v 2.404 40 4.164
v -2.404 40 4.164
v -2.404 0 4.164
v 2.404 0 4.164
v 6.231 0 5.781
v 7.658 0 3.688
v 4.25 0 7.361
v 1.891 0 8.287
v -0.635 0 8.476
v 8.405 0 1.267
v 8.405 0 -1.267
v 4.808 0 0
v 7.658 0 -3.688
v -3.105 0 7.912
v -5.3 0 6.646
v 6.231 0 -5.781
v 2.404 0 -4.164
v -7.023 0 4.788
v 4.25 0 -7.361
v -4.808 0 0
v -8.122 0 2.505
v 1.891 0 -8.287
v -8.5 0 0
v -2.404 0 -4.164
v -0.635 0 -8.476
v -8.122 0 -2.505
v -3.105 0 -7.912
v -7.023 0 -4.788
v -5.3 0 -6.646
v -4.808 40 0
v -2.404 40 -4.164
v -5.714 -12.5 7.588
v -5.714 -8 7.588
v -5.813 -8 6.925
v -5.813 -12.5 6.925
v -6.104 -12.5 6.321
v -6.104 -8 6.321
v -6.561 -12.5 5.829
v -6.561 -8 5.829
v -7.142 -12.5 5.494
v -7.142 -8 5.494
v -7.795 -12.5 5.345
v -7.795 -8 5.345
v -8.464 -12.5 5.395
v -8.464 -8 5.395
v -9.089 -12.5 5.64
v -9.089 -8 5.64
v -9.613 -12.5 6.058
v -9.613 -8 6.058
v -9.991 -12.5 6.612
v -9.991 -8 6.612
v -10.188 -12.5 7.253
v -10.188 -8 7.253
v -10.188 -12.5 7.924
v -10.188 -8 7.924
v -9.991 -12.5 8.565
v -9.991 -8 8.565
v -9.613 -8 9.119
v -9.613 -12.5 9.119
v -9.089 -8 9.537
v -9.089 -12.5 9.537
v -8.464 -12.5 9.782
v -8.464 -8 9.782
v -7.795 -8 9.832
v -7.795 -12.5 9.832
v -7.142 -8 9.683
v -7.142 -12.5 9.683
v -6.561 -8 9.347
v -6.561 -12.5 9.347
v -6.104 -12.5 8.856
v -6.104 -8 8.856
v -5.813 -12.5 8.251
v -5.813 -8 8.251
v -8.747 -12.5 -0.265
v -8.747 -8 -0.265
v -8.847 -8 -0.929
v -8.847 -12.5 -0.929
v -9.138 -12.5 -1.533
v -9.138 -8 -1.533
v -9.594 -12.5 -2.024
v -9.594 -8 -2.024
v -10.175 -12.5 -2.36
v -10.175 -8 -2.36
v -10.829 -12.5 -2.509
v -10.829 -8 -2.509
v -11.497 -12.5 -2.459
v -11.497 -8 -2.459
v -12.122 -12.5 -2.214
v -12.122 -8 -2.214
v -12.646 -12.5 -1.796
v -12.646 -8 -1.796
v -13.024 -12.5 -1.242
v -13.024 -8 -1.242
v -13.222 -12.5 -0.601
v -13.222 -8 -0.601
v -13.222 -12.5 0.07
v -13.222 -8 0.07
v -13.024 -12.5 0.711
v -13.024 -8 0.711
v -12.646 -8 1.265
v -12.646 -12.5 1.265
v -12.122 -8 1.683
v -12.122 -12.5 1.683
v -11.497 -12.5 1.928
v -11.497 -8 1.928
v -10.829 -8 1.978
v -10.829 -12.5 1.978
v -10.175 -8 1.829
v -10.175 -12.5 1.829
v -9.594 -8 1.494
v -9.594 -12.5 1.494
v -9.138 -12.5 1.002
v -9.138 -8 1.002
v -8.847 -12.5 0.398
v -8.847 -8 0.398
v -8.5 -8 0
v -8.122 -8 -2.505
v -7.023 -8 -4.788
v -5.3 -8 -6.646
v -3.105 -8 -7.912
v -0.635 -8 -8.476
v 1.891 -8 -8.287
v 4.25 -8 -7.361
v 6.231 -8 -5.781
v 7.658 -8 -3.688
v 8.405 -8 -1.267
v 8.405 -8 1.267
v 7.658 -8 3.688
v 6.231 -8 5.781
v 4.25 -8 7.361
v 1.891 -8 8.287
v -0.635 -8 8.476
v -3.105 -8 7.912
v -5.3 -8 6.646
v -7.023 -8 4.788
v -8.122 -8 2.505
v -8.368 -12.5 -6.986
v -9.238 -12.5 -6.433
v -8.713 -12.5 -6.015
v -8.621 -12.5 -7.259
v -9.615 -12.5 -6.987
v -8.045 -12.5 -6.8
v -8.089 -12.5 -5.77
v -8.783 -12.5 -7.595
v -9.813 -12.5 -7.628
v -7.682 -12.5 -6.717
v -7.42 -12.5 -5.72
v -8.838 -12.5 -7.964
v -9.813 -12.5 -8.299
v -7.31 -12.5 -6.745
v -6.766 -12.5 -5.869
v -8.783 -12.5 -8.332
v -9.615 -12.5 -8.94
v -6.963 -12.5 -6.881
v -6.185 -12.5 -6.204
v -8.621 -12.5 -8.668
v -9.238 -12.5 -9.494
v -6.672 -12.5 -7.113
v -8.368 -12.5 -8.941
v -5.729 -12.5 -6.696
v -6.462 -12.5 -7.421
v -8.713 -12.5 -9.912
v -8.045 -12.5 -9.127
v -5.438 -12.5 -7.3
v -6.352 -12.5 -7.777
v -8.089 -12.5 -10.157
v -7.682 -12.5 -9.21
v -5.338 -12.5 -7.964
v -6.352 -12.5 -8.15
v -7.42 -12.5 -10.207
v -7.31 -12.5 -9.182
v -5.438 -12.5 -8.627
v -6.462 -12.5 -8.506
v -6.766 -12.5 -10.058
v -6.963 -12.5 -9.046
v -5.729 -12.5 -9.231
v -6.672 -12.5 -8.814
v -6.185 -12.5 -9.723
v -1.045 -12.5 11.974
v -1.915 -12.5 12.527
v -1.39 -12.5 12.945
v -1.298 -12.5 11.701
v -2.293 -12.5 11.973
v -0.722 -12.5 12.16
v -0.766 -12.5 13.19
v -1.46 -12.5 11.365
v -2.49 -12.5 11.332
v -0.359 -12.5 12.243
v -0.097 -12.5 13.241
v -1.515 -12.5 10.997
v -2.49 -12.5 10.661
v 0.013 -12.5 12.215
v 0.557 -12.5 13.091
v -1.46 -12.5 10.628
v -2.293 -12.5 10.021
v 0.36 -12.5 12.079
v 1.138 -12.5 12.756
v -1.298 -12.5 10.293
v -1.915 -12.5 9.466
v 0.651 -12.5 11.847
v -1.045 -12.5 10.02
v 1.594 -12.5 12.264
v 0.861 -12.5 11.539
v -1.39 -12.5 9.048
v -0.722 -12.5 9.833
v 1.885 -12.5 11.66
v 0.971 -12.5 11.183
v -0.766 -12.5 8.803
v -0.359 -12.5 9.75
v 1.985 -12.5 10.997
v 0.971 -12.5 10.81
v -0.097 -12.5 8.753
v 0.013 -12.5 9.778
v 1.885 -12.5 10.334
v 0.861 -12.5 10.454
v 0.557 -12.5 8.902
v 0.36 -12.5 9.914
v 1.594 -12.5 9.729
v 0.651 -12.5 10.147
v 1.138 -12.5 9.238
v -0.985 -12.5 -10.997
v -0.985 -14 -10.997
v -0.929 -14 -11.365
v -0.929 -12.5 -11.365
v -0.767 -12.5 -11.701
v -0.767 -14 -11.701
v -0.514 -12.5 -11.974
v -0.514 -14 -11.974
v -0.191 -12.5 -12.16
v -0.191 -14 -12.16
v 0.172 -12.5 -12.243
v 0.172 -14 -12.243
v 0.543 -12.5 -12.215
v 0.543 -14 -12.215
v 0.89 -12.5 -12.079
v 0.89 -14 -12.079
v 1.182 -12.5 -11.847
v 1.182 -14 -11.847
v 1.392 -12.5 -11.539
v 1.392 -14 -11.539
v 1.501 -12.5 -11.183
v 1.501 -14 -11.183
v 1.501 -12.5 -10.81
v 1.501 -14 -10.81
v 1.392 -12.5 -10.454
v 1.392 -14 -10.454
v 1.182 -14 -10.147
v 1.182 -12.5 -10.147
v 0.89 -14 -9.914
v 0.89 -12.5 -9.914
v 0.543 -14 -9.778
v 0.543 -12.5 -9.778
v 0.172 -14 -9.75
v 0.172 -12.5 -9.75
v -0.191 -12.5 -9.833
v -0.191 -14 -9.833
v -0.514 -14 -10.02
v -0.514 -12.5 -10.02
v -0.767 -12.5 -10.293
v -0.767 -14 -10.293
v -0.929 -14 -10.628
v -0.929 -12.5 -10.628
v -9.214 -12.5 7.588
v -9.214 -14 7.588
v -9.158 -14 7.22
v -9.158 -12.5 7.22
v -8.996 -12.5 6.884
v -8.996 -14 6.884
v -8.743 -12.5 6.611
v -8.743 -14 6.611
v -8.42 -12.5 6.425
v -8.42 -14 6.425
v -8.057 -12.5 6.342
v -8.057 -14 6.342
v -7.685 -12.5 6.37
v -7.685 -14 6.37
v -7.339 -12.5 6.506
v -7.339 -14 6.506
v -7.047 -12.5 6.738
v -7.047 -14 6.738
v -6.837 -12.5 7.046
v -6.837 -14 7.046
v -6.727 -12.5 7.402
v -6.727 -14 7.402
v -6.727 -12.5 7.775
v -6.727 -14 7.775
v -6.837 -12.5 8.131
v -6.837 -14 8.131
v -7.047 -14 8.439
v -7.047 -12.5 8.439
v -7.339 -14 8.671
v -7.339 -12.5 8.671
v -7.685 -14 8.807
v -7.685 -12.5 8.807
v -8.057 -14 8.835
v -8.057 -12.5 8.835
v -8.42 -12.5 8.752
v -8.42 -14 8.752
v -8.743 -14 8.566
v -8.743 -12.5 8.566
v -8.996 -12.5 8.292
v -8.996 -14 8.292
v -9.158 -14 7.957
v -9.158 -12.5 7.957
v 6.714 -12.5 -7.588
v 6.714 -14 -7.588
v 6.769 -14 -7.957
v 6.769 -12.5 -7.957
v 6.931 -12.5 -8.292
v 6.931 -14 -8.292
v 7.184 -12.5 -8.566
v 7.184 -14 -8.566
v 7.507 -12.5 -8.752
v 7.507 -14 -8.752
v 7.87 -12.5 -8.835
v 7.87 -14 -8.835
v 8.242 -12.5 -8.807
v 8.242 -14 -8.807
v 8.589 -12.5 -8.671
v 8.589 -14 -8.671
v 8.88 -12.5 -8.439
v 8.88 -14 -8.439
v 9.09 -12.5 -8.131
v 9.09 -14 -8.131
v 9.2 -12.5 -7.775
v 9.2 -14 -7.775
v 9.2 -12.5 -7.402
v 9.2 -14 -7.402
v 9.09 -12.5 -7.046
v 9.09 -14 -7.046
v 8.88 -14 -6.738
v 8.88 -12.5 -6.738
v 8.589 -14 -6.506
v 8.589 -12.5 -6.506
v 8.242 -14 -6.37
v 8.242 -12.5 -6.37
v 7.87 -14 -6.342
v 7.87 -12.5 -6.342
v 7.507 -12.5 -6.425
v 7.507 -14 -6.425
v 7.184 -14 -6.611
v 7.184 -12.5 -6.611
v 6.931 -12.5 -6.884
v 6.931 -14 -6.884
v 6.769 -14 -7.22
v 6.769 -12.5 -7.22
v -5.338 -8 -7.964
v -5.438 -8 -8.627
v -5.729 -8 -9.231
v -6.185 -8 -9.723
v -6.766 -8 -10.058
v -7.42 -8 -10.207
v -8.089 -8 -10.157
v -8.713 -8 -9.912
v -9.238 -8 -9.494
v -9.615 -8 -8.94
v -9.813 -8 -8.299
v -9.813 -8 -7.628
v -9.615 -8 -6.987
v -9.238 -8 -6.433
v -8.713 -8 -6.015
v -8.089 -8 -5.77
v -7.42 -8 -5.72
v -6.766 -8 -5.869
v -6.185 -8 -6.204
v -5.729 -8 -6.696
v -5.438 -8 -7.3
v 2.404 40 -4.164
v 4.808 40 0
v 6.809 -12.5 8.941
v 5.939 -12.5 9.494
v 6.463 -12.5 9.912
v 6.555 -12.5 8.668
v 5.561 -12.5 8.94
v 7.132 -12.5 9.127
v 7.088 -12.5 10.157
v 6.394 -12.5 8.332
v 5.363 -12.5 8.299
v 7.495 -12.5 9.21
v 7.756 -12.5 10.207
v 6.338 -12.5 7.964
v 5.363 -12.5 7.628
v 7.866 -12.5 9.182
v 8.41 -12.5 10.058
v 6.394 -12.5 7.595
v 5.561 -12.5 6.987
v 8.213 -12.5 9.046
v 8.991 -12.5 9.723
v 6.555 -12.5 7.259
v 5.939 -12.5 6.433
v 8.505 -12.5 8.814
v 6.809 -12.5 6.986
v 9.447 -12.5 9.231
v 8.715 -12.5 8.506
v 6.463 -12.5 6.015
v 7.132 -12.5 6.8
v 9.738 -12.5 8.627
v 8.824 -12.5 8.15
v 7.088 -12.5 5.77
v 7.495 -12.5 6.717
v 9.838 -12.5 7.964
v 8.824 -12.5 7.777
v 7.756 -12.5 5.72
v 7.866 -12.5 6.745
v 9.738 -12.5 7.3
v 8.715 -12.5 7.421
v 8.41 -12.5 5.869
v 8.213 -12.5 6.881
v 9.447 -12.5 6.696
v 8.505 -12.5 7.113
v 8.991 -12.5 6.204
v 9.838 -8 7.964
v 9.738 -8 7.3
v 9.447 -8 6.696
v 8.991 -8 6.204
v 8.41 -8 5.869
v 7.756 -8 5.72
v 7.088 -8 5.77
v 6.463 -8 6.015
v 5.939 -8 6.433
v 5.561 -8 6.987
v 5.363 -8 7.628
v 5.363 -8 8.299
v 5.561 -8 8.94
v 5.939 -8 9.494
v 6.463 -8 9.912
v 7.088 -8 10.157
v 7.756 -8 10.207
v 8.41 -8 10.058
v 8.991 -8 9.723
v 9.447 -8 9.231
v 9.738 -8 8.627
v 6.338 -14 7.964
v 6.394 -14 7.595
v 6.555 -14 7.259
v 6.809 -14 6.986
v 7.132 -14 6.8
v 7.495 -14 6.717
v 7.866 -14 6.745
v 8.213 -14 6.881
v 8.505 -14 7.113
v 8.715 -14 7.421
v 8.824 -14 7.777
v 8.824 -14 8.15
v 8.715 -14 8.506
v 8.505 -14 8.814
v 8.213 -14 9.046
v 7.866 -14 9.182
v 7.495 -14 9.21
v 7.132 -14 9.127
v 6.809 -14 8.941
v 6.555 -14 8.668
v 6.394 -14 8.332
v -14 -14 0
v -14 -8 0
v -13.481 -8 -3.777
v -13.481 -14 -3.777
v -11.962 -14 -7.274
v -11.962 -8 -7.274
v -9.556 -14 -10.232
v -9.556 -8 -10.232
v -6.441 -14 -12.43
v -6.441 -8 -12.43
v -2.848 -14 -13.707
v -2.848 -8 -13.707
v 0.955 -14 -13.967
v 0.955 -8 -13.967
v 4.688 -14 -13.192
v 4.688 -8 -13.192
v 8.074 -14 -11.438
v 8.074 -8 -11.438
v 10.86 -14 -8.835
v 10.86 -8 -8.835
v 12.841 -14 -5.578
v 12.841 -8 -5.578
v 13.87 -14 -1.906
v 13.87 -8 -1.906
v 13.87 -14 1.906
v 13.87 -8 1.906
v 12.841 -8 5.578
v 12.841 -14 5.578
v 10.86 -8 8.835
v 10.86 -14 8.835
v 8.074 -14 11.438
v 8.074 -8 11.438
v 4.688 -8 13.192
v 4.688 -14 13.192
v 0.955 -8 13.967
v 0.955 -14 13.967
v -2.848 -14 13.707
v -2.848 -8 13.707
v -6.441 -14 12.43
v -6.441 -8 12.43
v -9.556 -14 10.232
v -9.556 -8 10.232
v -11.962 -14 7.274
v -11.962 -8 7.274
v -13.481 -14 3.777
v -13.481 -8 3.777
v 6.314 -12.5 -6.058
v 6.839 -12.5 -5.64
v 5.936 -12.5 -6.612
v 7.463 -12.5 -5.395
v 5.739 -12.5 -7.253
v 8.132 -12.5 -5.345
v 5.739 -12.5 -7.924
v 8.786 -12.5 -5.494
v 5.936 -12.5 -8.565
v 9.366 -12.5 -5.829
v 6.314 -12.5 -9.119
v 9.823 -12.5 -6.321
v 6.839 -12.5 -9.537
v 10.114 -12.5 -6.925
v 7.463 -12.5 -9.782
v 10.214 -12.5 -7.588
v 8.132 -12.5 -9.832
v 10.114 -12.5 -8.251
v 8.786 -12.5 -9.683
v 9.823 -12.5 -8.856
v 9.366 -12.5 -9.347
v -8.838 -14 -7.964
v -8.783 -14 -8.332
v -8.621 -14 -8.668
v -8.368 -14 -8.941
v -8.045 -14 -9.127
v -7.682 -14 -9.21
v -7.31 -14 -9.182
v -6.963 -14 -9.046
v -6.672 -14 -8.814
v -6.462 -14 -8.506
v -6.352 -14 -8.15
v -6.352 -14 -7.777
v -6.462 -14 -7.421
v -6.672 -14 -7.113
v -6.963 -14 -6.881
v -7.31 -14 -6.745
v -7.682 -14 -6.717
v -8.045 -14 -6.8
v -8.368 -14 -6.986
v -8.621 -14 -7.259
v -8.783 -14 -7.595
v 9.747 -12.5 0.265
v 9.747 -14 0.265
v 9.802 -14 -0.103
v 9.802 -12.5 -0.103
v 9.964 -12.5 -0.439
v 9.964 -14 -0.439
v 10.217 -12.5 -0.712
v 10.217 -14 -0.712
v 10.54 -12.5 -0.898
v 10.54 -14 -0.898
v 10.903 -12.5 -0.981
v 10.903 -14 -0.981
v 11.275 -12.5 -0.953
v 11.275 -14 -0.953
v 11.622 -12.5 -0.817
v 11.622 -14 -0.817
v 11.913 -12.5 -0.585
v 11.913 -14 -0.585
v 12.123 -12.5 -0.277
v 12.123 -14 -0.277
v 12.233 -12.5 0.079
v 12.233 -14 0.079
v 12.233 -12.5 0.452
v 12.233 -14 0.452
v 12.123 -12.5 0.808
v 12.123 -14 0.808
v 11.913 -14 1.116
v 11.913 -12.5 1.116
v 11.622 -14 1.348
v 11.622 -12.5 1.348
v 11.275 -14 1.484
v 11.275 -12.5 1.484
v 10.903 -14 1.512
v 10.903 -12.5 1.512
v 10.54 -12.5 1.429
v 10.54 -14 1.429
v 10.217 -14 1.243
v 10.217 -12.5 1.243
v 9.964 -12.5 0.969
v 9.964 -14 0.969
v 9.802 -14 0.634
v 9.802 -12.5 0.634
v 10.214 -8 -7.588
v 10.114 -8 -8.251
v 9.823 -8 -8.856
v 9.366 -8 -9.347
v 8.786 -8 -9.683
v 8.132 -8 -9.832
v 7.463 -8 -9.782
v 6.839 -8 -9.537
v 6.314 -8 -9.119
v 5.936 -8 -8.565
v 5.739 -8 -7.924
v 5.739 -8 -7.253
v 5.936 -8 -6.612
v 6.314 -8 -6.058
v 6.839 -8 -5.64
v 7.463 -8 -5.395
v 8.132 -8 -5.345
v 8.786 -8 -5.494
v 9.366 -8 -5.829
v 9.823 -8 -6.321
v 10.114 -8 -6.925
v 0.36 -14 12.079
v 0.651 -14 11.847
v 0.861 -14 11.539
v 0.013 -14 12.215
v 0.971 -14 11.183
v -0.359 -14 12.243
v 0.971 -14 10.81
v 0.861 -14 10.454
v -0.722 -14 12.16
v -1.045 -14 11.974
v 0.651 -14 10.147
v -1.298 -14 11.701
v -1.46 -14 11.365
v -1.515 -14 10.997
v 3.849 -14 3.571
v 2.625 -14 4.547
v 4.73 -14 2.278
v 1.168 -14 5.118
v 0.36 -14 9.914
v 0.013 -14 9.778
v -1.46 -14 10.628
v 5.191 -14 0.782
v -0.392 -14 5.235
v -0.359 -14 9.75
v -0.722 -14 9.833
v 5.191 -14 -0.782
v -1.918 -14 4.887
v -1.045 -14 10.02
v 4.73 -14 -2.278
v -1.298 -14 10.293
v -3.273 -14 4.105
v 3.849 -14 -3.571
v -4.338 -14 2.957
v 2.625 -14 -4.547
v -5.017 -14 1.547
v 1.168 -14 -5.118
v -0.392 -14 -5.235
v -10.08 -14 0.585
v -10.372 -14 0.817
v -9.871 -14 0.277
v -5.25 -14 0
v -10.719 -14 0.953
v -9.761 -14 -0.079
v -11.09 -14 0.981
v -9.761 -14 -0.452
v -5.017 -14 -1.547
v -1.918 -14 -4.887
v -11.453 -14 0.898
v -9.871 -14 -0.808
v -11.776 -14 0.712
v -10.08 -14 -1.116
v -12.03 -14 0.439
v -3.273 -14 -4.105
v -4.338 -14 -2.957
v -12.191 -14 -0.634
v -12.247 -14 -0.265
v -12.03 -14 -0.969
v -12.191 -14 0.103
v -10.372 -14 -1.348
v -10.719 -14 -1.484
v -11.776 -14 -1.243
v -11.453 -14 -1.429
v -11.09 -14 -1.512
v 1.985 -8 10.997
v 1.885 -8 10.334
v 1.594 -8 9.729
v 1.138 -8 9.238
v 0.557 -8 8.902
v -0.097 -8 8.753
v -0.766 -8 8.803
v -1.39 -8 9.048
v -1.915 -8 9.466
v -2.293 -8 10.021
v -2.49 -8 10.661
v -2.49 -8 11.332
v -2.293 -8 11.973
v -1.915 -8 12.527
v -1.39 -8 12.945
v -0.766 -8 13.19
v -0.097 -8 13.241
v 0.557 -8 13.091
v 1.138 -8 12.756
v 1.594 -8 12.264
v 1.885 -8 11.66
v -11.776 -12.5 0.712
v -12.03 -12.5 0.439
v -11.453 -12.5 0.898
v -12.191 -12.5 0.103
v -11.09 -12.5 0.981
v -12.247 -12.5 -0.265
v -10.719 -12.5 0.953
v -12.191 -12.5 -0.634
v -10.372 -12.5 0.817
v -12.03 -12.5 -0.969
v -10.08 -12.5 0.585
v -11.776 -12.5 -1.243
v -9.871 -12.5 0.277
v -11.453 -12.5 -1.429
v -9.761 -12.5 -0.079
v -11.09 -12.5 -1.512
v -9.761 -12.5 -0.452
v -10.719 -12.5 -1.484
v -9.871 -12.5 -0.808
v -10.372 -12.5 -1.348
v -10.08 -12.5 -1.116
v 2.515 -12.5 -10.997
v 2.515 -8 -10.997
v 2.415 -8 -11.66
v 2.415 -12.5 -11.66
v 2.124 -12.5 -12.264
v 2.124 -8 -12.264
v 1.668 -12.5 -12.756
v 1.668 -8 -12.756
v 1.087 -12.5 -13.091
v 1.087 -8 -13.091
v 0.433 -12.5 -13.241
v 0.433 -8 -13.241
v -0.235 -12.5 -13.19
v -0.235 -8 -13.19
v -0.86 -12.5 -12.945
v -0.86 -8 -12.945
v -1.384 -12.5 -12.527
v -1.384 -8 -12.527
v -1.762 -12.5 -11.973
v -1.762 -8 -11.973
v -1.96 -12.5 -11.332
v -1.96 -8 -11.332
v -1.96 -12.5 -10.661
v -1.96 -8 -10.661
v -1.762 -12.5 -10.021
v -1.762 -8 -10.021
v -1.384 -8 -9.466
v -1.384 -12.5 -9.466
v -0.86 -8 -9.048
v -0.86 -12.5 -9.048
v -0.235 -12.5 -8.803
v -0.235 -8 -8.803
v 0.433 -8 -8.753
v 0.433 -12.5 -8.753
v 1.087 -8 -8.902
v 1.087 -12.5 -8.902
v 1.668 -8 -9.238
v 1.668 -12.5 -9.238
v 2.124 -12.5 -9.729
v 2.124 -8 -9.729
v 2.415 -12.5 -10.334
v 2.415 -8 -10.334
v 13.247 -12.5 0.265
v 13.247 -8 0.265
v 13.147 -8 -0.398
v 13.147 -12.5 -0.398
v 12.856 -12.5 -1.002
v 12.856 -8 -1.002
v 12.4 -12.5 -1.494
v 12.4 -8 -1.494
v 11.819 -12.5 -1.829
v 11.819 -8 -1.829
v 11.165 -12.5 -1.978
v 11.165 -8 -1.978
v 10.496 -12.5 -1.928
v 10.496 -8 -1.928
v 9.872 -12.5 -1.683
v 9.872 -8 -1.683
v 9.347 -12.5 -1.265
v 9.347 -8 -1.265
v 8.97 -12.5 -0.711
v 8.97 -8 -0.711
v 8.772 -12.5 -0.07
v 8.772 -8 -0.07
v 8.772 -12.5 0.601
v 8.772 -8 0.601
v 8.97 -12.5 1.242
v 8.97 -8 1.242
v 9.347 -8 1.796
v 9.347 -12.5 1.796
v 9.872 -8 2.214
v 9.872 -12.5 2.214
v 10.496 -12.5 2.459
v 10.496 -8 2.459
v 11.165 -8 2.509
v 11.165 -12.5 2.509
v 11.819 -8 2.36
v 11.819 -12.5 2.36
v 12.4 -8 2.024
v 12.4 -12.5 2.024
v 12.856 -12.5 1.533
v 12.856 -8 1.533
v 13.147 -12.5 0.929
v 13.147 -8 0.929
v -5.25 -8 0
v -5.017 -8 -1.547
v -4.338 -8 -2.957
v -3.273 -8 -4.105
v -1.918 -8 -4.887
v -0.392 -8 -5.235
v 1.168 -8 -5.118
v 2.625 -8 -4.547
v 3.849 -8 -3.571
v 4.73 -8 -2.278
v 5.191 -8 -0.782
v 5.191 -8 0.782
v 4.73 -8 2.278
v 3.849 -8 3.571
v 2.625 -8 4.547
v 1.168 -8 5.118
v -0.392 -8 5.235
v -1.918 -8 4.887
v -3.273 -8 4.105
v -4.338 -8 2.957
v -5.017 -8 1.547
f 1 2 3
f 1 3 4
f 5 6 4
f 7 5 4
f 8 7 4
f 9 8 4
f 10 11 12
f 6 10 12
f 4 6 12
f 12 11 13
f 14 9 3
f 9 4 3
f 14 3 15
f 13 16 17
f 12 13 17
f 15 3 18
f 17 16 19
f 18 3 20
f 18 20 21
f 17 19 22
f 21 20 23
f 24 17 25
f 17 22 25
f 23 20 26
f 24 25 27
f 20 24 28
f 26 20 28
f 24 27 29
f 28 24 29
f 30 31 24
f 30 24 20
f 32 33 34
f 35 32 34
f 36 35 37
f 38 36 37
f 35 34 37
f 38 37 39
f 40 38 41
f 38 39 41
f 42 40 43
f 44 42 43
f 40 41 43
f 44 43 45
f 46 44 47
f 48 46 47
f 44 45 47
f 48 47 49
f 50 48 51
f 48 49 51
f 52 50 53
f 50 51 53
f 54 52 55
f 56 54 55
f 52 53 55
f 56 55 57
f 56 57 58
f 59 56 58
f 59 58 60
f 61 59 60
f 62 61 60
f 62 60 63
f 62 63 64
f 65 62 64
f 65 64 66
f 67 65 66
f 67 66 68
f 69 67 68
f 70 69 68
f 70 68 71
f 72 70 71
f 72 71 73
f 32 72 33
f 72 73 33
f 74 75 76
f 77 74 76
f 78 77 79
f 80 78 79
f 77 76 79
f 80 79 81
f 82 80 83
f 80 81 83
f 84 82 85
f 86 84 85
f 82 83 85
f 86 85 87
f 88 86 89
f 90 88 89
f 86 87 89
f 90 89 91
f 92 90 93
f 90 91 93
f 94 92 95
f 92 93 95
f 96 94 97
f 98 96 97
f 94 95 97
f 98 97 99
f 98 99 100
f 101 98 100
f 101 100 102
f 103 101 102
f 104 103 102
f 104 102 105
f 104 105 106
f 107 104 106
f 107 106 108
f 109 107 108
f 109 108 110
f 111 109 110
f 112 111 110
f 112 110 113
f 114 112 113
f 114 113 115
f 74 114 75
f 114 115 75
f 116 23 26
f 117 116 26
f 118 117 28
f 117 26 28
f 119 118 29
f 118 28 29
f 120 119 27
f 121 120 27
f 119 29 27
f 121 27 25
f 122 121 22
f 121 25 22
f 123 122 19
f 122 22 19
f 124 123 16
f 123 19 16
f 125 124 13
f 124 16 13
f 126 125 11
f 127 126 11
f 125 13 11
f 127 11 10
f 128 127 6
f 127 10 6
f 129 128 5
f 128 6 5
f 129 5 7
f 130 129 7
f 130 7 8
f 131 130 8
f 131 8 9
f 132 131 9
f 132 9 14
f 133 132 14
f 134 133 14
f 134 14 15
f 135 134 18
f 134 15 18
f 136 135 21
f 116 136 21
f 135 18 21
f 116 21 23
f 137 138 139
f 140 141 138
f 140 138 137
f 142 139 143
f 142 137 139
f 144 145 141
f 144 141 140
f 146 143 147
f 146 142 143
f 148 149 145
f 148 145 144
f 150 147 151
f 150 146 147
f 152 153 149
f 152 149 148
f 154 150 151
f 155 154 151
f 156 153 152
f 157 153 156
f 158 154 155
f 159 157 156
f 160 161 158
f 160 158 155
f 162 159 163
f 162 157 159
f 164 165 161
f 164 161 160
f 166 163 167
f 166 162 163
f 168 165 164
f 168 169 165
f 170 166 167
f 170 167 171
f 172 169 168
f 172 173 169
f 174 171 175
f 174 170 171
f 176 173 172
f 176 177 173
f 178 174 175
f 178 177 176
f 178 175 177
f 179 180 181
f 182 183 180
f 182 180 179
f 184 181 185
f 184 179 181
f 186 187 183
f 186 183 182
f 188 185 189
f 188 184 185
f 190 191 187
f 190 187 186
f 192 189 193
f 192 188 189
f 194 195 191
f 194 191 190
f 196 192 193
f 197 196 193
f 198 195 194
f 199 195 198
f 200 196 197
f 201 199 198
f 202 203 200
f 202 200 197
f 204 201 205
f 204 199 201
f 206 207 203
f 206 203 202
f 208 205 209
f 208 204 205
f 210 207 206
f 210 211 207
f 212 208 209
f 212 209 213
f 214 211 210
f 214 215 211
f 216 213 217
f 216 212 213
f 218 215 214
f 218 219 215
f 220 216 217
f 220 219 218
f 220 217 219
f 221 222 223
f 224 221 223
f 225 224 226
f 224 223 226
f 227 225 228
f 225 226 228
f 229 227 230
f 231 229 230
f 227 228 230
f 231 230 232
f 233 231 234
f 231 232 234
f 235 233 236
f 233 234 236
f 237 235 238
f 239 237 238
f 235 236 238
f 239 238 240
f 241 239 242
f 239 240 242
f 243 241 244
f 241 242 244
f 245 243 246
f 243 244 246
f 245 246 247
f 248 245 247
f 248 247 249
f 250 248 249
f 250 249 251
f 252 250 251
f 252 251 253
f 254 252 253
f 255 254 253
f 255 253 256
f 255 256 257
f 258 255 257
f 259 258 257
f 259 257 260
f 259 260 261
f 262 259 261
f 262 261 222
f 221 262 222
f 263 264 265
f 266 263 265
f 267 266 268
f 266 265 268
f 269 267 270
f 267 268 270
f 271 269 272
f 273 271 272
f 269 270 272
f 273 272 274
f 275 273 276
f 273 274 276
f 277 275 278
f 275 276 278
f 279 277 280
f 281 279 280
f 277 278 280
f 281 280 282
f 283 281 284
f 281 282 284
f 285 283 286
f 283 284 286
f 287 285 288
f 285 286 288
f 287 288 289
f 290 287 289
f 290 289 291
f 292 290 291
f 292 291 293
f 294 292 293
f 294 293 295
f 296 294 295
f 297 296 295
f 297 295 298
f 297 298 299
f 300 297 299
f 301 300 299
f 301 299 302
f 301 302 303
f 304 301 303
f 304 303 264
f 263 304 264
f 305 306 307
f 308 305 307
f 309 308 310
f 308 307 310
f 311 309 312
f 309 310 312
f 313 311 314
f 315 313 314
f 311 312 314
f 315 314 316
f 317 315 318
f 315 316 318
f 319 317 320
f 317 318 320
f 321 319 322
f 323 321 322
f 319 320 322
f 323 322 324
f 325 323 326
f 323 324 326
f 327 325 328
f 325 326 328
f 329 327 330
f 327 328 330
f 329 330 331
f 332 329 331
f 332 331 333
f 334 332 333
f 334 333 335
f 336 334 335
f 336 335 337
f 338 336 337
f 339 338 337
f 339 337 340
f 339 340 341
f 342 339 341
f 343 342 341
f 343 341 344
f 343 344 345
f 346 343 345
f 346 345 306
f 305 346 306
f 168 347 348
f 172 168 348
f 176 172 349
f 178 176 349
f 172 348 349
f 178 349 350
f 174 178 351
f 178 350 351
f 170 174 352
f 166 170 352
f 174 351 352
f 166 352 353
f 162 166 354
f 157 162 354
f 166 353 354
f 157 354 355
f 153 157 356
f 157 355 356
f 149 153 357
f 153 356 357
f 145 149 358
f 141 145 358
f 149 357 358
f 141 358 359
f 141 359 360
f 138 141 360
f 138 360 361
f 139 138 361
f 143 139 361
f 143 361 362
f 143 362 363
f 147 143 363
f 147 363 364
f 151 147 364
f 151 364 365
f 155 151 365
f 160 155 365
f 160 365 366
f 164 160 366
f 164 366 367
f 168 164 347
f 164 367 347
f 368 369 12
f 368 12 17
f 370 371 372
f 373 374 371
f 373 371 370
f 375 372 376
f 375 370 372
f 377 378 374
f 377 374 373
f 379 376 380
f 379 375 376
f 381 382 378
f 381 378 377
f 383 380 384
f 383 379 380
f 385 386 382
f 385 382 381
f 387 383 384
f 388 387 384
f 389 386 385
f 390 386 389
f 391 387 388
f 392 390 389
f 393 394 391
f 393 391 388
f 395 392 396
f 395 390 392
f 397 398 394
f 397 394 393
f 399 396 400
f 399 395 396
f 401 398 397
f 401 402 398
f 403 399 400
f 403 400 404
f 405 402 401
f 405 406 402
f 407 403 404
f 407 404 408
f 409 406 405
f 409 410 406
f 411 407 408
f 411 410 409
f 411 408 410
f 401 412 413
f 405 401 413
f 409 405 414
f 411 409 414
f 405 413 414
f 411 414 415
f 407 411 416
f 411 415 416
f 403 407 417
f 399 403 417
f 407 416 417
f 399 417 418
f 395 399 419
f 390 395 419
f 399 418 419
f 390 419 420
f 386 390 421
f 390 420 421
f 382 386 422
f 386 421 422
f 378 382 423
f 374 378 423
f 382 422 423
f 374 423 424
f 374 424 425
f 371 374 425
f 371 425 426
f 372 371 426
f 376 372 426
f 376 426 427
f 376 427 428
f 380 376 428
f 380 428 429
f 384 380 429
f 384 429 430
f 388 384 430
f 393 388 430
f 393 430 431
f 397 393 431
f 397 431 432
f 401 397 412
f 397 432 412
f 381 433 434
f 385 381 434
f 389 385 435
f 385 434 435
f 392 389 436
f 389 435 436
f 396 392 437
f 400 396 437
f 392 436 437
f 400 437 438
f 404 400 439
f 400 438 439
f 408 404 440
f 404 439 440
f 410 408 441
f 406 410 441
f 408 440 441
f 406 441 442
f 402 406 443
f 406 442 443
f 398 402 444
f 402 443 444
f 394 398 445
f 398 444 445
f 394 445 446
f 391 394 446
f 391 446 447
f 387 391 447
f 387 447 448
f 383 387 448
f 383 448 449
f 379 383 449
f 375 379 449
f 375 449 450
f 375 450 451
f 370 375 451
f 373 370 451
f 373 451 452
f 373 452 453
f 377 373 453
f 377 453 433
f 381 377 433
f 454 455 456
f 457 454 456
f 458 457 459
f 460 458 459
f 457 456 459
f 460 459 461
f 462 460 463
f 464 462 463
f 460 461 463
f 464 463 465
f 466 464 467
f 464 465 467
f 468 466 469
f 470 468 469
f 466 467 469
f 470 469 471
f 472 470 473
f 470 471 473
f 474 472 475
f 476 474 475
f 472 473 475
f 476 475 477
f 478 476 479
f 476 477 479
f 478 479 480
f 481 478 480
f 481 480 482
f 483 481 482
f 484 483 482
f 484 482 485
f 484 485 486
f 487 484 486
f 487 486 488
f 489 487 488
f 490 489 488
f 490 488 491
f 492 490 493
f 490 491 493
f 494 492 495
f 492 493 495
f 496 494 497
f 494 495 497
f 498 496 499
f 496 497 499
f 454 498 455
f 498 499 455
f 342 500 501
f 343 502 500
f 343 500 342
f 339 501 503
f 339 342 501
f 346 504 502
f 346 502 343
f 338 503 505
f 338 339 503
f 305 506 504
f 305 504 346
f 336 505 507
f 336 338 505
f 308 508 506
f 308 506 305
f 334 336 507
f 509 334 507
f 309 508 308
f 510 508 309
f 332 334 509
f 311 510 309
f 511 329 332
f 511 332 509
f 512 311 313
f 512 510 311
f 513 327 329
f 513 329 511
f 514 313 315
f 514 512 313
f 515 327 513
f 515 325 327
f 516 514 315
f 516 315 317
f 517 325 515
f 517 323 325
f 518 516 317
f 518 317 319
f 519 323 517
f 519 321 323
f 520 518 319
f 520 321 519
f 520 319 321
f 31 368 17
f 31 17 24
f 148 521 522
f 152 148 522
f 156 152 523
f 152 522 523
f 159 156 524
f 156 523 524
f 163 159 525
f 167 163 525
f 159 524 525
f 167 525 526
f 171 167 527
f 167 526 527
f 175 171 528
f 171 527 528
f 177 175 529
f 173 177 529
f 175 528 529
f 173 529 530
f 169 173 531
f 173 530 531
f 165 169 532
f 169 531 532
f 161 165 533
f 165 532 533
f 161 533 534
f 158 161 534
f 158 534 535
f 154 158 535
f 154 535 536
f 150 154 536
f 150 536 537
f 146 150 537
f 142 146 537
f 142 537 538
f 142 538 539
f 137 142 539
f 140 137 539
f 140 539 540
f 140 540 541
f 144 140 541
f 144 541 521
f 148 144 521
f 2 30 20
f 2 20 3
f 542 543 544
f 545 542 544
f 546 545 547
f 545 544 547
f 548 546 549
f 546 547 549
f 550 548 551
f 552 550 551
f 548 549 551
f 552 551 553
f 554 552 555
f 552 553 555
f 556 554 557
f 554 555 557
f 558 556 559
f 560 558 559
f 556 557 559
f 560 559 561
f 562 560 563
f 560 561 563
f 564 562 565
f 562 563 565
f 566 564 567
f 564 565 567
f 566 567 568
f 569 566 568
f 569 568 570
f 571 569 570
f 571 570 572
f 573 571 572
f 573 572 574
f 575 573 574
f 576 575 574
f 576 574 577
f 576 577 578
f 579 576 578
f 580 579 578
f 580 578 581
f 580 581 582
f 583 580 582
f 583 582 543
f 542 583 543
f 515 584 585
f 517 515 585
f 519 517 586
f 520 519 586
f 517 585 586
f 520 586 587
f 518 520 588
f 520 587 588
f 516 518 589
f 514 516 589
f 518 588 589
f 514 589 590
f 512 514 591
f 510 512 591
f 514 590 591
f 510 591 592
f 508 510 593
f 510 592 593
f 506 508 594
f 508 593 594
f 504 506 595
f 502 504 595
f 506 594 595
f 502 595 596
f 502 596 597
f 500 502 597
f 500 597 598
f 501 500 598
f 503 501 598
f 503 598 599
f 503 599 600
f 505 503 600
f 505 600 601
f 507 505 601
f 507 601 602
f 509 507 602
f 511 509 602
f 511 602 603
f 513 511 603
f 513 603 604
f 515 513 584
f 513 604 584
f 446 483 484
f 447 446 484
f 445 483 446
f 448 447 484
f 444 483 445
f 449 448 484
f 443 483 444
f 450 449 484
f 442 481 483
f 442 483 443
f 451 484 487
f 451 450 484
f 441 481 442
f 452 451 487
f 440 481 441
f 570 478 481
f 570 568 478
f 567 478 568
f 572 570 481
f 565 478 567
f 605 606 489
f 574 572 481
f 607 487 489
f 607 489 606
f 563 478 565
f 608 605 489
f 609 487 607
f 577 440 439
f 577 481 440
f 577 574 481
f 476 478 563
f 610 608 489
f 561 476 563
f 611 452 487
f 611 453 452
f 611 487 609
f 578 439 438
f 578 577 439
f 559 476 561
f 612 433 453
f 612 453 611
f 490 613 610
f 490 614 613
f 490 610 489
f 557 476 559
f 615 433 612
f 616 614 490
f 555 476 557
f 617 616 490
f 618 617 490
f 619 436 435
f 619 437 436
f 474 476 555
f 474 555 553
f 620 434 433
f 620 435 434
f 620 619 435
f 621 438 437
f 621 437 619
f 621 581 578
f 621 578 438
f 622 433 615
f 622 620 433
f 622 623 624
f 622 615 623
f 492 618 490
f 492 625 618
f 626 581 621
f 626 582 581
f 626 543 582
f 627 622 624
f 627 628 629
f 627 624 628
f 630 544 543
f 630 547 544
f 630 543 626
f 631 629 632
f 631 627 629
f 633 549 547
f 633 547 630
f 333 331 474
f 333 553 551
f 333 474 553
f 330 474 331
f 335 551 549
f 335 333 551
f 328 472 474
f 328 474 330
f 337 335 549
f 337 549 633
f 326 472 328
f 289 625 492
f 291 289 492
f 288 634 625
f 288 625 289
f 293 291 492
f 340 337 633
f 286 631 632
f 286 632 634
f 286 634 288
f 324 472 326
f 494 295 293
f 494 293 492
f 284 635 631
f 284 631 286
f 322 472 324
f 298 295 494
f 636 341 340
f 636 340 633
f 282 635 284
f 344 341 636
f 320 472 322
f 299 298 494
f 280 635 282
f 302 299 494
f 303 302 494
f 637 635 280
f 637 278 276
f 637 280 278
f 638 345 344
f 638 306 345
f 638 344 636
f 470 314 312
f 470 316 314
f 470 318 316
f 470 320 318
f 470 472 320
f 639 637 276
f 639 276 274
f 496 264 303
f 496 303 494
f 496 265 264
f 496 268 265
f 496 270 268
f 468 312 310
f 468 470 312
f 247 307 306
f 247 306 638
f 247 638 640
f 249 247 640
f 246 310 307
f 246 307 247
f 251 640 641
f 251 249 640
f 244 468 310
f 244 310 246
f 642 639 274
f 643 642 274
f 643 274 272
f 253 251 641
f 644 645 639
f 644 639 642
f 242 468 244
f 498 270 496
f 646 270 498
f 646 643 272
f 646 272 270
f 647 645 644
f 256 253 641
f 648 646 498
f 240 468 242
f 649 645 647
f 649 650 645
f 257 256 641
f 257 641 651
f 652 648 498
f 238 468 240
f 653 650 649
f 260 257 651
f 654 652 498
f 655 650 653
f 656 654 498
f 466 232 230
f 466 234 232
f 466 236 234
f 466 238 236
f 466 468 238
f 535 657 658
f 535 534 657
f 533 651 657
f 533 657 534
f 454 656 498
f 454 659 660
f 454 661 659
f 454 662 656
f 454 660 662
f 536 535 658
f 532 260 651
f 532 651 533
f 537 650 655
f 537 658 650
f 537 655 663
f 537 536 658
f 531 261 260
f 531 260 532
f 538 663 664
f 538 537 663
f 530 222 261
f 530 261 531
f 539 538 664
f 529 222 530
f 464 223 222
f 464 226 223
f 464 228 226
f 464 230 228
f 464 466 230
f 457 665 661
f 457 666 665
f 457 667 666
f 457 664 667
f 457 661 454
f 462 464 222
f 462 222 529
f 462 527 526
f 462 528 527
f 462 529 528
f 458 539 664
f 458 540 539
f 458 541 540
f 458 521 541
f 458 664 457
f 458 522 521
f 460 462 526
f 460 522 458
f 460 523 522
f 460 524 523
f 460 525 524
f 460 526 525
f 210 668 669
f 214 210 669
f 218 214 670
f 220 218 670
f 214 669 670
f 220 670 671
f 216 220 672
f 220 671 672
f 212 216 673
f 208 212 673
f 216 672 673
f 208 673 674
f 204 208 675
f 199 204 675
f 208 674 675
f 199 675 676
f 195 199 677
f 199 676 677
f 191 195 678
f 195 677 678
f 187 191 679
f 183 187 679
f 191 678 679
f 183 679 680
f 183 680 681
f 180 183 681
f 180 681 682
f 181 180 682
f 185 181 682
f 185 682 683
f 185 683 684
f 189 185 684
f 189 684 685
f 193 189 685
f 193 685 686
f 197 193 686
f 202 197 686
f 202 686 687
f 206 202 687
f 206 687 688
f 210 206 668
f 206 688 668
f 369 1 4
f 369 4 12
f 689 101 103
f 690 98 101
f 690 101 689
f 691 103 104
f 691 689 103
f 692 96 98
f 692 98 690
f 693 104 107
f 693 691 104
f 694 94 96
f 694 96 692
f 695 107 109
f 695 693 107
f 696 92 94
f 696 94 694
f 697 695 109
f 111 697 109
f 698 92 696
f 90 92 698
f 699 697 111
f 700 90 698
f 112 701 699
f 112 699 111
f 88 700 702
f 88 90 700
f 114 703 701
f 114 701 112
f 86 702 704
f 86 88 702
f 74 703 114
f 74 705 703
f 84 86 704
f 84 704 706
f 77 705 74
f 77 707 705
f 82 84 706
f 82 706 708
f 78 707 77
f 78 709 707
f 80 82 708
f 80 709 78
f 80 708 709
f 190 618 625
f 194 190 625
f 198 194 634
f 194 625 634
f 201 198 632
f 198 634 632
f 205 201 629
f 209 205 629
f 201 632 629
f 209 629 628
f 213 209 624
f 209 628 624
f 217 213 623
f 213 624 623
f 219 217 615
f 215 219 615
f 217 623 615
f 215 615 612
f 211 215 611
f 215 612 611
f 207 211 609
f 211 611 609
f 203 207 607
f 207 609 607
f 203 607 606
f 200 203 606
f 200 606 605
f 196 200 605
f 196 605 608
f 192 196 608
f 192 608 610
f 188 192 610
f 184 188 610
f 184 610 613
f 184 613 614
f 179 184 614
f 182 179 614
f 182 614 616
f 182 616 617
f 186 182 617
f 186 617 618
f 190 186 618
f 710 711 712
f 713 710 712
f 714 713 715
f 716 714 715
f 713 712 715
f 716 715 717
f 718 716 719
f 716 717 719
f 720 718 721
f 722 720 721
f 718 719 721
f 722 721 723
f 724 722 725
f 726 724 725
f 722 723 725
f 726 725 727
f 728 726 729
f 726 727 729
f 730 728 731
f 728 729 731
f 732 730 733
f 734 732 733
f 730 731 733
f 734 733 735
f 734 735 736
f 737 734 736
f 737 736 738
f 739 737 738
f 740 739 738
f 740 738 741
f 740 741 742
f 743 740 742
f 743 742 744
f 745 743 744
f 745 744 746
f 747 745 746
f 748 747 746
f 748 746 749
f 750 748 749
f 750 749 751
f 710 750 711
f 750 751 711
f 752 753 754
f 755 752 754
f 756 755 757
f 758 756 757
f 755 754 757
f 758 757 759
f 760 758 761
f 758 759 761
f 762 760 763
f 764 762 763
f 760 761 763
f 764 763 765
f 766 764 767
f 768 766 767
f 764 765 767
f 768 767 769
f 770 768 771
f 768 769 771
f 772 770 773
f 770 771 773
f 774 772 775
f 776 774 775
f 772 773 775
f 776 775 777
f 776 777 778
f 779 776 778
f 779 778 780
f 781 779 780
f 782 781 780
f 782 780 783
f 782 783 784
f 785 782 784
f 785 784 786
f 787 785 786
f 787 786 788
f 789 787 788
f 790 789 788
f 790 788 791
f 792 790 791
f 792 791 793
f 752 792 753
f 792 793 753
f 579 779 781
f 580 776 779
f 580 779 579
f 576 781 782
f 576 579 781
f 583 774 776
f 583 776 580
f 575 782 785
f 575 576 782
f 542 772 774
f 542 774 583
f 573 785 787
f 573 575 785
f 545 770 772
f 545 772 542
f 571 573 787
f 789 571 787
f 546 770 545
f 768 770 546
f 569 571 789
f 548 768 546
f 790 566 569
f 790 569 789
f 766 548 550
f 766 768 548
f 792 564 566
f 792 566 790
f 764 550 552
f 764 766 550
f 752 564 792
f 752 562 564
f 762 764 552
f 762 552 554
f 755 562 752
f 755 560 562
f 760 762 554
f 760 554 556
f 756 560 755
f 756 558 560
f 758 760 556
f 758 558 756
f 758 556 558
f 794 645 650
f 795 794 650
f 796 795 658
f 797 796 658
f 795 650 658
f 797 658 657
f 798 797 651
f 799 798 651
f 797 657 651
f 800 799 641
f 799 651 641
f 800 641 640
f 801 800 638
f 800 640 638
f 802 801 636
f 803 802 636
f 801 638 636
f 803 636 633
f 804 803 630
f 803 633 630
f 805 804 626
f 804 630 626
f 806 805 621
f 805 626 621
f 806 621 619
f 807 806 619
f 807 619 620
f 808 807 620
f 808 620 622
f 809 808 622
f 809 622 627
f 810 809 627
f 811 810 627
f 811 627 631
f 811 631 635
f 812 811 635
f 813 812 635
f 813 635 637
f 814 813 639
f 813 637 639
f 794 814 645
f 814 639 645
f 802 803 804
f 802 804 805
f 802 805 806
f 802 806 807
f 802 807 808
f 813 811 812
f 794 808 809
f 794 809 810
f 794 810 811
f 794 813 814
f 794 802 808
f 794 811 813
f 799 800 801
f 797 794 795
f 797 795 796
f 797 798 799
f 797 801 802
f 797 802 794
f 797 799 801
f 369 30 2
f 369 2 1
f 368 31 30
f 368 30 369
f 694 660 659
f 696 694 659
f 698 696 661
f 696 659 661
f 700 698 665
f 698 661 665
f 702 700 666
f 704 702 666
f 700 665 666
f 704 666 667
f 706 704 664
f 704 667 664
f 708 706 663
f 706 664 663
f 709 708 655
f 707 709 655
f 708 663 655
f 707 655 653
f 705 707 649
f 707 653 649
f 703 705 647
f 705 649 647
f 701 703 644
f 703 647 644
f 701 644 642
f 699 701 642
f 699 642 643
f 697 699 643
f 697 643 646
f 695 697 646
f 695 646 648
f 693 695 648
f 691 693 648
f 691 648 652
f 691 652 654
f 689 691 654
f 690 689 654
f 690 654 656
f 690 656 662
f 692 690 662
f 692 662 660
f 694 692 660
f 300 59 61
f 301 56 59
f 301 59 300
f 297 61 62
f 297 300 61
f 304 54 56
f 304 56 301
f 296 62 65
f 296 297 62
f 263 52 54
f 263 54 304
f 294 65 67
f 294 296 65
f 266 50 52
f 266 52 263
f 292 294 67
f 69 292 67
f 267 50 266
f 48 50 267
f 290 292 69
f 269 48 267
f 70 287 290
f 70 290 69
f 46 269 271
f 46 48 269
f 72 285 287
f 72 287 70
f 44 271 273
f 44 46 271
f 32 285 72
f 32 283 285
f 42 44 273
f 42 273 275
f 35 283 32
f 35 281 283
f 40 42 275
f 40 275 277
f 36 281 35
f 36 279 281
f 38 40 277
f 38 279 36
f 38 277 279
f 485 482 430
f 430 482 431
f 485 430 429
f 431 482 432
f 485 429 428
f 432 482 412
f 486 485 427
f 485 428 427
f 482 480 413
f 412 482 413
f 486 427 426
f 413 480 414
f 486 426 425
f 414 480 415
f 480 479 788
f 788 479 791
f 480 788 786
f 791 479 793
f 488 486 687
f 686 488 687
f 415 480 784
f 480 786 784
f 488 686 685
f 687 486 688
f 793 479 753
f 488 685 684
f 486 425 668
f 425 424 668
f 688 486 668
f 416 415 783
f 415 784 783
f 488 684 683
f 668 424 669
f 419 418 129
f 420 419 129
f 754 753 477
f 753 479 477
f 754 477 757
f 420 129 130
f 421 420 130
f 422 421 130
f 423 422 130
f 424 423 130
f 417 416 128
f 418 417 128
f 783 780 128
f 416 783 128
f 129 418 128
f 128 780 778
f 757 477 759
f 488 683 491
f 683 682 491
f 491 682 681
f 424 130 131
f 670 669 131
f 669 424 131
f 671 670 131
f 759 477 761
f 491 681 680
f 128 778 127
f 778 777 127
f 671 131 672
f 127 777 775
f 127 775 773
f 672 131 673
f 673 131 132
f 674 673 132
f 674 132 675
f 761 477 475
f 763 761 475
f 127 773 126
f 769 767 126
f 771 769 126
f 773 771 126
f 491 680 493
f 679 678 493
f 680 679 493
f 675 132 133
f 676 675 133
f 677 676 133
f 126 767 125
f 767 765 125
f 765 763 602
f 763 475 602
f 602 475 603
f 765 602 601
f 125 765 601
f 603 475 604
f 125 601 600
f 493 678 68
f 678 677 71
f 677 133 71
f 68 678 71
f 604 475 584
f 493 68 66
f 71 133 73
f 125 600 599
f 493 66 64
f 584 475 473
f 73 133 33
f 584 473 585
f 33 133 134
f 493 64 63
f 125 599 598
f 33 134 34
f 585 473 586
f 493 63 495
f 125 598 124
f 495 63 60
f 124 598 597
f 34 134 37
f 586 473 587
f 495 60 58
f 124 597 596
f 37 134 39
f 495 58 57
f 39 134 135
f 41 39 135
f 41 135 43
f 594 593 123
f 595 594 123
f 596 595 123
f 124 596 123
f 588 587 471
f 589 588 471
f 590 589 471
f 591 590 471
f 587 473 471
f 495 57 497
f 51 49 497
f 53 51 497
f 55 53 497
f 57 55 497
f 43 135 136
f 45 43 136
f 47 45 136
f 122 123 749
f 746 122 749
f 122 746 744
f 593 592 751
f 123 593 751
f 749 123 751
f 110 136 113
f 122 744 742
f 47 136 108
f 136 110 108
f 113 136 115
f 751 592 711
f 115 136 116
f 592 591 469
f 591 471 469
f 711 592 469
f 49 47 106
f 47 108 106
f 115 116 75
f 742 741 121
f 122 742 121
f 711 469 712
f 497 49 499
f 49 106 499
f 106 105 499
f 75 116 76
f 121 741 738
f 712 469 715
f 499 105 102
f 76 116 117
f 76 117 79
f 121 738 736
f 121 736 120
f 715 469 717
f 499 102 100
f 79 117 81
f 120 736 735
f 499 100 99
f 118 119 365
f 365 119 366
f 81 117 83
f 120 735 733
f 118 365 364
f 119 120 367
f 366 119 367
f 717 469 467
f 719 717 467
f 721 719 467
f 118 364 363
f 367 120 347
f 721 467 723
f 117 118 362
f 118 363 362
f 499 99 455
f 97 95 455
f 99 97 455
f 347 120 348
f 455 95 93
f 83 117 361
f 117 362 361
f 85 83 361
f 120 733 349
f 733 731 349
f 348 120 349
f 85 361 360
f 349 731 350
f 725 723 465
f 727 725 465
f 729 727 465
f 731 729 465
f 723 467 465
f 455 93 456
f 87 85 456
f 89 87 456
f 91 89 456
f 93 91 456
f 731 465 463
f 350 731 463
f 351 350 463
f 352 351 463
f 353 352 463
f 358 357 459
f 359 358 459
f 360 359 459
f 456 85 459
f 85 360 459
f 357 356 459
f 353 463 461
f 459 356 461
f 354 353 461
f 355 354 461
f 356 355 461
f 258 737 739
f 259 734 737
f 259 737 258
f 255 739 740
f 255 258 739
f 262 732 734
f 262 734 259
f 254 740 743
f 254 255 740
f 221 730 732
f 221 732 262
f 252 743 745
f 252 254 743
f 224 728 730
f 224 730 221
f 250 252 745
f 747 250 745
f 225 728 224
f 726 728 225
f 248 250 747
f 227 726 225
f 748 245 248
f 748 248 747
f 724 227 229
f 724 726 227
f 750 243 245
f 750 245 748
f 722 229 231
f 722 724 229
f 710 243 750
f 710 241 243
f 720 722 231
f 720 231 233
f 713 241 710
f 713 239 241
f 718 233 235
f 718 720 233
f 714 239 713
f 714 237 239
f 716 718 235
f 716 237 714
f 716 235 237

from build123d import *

# Parameters (mm, degrees)
BOSS_EXTRUDE1_DEPTH = 40
SKETCH3_R           = 8.5
BOSS_EXTRUDE2_DEPTH = 8
SKETCH4_R           = 14
BOSS_EXTRUDE3_DEPTH = 6
SKETCH13_R          = 1.25
CUT_EXTRUDE8_DEPTH  = 3
SKETCH14_R          = 5.25
CUT_EXTRUDE9_DEPTH  = 6
SKETCH15_R          = 2.25
CUT_EXTRUDE10_DEPTH = 4.5


with BuildPart() as part:
    # Sketch1 → Boss-Extrude1 (new body)
    with BuildSketch(Plane(origin=(0, 0, 0), x_dir=(1, 0, 0), z_dir=(0, 1, 0))):
        Polygon((-4.807996979, 0), (-2.40399849, -4.163847525), (2.40399849, -4.163847525), (4.807996979, 0), (2.40399849, 4.163847525), (-2.40399849, 4.163847525), align=None)
    extrude(amount=BOSS_EXTRUDE1_DEPTH)

    # Sketch3 → Boss-Extrude2 (add)
    with BuildSketch(Plane(origin=(0, 0, 0), x_dir=(-1, 0, 0), z_dir=(0, -1, 0))):
        Circle(SKETCH3_R)
    extrude(amount=BOSS_EXTRUDE2_DEPTH)

    # Sketch4 → Boss-Extrude3 (add)
    with BuildSketch(Plane(origin=(0, -8, 0), x_dir=(-1, 0, 0), z_dir=(0, -1, 0))):
        Circle(SKETCH4_R)
    extrude(amount=BOSS_EXTRUDE3_DEPTH)

    # Sketch13 → Cut-Extrude8 (cut)
    with BuildSketch(Plane(origin=(0, -14, 0), x_dir=(-1, 0, 0), z_dir=(0, -1, 0))):
        with Locations((7.588295109, 7.963527946)):
            Circle(SKETCH13_R)
        with Locations((10.996799542, 0.265329684)):
            Circle(SKETCH13_R)
        with Locations((7.963527946, -7.588295109)):
            Circle(SKETCH13_R)
        with Locations((0.265329684, -10.996799542)):
            Circle(SKETCH13_R)
        with Locations((-7.588295109, -7.963527946)):
            Circle(SKETCH13_R)
        with Locations((-10.996799542, -0.265329684)):
            Circle(SKETCH13_R)
        with Locations((-7.963527946, 7.588295109)):
            Circle(SKETCH13_R)
        with Locations((-0.265329684, 10.996799542)):
            Circle(SKETCH13_R)
    extrude(amount=-CUT_EXTRUDE8_DEPTH, mode=Mode.SUBTRACT)

    # Sketch14 → Cut-Extrude9 (cut)
    with BuildSketch(Plane(origin=(0, -14, 0), x_dir=(-1, 0, 0), z_dir=(0, -1, 0))):
        Circle(SKETCH14_R)
    extrude(amount=-CUT_EXTRUDE9_DEPTH, mode=Mode.SUBTRACT)

    # Sketch15 → Cut-Extrude10 (cut)
    with BuildSketch(Plane(origin=(0, -8, 0), x_dir=(1, 0, 0), z_dir=(0, 1, 0))):
        with Locations((10.996799542, -0.265329684)):
            Circle(SKETCH15_R)
        with Locations((7.588295109, -7.963527946)):
            Circle(SKETCH15_R)
        with Locations((-0.265329684, -10.996799542)):
            Circle(SKETCH15_R)
        with Locations((-7.963527946, -7.588295109)):
            Circle(SKETCH15_R)
        with Locations((-10.996799542, 0.265329684)):
            Circle(SKETCH15_R)
        with Locations((-7.588295109, 7.963527946)):
            Circle(SKETCH15_R)
        with Locations((0.265329684, 10.996799542)):
            Circle(SKETCH15_R)
        with Locations((7.963527946, 7.588295109)):
            Circle(SKETCH15_R)
    extrude(amount=-CUT_EXTRUDE10_DEPTH, mode=Mode.SUBTRACT)


solid = part.part
